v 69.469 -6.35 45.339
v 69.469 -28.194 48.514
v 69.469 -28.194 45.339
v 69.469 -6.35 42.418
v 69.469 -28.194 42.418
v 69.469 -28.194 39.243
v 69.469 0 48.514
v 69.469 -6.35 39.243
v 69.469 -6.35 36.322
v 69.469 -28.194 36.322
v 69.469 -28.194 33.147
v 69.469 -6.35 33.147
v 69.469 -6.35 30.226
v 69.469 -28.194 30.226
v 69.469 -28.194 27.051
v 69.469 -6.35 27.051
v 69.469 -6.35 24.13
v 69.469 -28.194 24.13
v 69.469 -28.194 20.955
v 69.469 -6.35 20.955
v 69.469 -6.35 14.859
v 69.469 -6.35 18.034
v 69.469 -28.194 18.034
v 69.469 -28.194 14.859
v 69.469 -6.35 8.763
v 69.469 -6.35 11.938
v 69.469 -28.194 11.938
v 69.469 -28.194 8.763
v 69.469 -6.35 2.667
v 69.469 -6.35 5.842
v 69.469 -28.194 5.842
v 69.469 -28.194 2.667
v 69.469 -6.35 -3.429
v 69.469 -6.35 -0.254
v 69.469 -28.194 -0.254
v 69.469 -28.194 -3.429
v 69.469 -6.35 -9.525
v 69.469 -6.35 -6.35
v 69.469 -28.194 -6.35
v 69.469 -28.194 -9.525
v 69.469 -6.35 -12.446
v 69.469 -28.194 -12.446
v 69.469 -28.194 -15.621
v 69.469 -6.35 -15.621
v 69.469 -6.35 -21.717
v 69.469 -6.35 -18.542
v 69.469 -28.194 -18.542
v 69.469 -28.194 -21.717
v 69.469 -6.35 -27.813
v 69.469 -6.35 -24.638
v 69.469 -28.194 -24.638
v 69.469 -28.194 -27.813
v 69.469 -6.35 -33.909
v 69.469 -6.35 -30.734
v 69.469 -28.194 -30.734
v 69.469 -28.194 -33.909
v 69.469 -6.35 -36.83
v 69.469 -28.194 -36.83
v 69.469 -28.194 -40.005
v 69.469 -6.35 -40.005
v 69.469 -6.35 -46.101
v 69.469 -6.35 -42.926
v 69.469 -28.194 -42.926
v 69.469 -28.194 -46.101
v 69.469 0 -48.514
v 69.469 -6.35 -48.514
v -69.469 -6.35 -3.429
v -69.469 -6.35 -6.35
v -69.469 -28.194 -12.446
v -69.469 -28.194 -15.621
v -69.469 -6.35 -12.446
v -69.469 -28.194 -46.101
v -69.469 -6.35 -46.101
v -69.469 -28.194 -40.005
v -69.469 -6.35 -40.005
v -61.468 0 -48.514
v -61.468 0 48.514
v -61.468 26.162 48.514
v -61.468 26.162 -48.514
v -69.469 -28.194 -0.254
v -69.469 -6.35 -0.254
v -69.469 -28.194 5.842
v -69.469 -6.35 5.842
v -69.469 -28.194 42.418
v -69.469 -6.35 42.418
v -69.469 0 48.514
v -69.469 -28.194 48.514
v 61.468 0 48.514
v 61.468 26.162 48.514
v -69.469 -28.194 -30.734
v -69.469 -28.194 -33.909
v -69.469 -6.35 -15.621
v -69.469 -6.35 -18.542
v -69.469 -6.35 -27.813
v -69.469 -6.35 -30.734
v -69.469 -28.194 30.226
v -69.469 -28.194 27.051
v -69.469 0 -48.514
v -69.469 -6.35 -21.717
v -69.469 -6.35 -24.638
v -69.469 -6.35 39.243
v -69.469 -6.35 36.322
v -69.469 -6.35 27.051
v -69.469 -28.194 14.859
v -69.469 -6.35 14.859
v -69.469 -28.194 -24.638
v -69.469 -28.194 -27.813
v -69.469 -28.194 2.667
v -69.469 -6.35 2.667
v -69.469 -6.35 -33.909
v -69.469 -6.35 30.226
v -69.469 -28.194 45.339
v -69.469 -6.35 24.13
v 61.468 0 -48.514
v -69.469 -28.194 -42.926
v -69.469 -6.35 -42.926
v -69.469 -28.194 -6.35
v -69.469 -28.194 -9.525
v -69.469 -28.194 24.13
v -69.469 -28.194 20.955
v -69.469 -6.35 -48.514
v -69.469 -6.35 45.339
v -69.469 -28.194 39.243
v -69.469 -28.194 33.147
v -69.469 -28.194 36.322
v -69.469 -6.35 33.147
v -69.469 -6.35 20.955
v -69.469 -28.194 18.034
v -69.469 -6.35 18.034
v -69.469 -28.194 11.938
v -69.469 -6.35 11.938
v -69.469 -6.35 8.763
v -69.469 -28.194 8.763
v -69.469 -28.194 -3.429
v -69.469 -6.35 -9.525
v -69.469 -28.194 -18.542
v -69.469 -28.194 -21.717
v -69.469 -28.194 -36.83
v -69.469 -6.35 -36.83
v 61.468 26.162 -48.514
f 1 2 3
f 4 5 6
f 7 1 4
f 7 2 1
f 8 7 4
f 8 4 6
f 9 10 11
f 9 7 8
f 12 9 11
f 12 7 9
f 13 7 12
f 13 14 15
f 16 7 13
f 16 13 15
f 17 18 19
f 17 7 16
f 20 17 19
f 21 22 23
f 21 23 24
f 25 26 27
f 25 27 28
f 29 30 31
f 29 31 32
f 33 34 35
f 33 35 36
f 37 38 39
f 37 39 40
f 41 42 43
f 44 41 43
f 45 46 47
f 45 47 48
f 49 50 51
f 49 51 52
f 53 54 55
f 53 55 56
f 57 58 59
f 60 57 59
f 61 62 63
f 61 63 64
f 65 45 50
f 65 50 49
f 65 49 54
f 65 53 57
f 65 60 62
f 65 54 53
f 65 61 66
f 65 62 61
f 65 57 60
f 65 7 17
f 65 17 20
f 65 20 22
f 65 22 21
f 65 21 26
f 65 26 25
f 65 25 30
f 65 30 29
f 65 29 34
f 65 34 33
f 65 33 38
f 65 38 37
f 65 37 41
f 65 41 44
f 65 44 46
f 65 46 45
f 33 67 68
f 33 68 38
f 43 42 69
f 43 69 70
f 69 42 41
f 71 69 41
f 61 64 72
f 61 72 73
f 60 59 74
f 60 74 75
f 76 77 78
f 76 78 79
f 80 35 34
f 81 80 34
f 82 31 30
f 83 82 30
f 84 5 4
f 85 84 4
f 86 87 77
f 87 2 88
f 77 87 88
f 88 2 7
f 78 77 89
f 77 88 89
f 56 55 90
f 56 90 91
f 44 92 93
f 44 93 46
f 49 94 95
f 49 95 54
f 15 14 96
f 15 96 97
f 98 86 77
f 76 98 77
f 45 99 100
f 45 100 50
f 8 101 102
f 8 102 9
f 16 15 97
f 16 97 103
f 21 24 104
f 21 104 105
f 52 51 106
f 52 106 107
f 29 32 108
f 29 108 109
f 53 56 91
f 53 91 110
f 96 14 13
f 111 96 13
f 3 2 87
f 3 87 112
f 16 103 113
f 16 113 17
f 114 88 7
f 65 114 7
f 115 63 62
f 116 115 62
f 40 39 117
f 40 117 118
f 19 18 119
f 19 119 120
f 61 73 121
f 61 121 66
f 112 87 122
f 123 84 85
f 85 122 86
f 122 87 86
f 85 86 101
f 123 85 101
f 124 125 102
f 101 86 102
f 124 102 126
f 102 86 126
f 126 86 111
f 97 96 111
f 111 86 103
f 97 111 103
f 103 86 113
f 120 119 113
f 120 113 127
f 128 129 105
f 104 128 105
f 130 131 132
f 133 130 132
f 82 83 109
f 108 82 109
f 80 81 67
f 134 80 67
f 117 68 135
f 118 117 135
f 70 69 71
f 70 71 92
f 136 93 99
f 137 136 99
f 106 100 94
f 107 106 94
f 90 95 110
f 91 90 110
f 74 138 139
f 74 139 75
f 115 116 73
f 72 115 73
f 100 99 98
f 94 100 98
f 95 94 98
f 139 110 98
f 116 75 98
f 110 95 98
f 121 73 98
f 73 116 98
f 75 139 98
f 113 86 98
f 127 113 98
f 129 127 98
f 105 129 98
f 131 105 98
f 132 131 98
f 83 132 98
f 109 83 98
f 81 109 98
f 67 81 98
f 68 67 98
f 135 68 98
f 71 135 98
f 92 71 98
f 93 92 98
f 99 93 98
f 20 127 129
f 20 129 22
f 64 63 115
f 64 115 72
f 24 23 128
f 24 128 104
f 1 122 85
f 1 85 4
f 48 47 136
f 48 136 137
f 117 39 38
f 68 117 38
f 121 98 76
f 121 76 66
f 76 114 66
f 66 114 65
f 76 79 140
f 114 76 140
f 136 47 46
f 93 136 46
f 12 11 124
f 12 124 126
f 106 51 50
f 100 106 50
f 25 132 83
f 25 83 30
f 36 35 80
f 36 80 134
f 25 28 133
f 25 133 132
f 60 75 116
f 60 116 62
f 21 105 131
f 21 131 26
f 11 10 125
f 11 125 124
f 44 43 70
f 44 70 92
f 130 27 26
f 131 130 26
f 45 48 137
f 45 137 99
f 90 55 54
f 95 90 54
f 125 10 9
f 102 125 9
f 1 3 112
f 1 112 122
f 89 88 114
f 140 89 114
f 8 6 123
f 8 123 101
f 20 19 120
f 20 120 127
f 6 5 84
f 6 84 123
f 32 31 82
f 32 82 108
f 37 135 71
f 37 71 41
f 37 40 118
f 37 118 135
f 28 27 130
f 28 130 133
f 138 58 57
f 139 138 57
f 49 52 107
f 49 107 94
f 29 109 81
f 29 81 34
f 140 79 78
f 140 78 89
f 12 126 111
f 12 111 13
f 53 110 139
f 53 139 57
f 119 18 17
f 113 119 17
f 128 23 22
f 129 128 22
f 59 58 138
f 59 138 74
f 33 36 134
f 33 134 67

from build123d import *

# Parameters (mm, degrees)
SKETCH1_W           = 122.936
SKETCH1_H           = 97.028
BOSS_EXTRUDE1_DEPTH = 26.162
SKETCH2_W           = 138.938
SKETCH2_H           = 97.028
BOSS_EXTRUDE2_DEPTH = 6.35
SKETCH3_W           = 3.175
SKETCH3_H           = 21.844
BOSS_EXTRUDE3_DEPTH = 138.938


with BuildPart() as part:
    # Sketch1 → Boss-Extrude1 (new body)
    with BuildSketch(Plane(origin=(0, 0, 0), x_dir=(1, 0, 0), z_dir=(0, 1, 0))):
        Rectangle(SKETCH1_W, SKETCH1_H)
    extrude(amount=BOSS_EXTRUDE1_DEPTH)

    # Sketch2 → Boss-Extrude2 (add)
    with BuildSketch(Plane.XZ):
        Rectangle(SKETCH2_W, SKETCH2_H)
    extrude(amount=BOSS_EXTRUDE2_DEPTH)

    # Sketch3 → Boss-Extrude3 (add, through all)
    with BuildSketch(Plane(origin=(69.469, 0, 0), x_dir=(0, 0, -1), z_dir=(1, 0, 0))):
        with Locations((-40.8305, -17.272)):
            Rectangle(SKETCH3_W, SKETCH3_H)
        with Locations((-46.9265, -17.272)):
            Rectangle(SKETCH3_W, SKETCH3_H)
        with Locations((-34.7345, -17.272)):
            Rectangle(SKETCH3_W, SKETCH3_H)
        with Locations((-28.6385, -17.272)):
            Rectangle(SKETCH3_W, SKETCH3_H)
        with Locations((-22.5425, -17.272)):
            Rectangle(SKETCH3_W, SKETCH3_H)
        with Locations((-16.4465, -17.272)):
            Rectangle(SKETCH3_W, SKETCH3_H)
        with Locations((-10.3505, -17.272)):
            Rectangle(SKETCH3_W, SKETCH3_H)
        with Locations((-4.2545, -17.272)):
            Rectangle(SKETCH3_W, SKETCH3_H)
        with Locations((1.8415, -17.272)):
            Rectangle(SKETCH3_W, SKETCH3_H)
        with Locations((7.9375, -17.272)):
            Rectangle(SKETCH3_W, SKETCH3_H)
        with Locations((14.0335, -17.272)):
            Rectangle(SKETCH3_W, SKETCH3_H)
        with Locations((20.1295, -17.272)):
            Rectangle(SKETCH3_W, SKETCH3_H)
        with Locations((26.2255, -17.272)):
            Rectangle(SKETCH3_W, SKETCH3_H)
        with Locations((32.3215, -17.272)):
            Rectangle(SKETCH3_W, SKETCH3_H)
        with Locations((38.4175, -17.272)):
            Rectangle(SKETCH3_W, SKETCH3_H)
        with Locations((44.5135, -17.272)):
            Rectangle(SKETCH3_W, SKETCH3_H)
    extrude(amount=-BOSS_EXTRUDE3_DEPTH)


solid = part.part
